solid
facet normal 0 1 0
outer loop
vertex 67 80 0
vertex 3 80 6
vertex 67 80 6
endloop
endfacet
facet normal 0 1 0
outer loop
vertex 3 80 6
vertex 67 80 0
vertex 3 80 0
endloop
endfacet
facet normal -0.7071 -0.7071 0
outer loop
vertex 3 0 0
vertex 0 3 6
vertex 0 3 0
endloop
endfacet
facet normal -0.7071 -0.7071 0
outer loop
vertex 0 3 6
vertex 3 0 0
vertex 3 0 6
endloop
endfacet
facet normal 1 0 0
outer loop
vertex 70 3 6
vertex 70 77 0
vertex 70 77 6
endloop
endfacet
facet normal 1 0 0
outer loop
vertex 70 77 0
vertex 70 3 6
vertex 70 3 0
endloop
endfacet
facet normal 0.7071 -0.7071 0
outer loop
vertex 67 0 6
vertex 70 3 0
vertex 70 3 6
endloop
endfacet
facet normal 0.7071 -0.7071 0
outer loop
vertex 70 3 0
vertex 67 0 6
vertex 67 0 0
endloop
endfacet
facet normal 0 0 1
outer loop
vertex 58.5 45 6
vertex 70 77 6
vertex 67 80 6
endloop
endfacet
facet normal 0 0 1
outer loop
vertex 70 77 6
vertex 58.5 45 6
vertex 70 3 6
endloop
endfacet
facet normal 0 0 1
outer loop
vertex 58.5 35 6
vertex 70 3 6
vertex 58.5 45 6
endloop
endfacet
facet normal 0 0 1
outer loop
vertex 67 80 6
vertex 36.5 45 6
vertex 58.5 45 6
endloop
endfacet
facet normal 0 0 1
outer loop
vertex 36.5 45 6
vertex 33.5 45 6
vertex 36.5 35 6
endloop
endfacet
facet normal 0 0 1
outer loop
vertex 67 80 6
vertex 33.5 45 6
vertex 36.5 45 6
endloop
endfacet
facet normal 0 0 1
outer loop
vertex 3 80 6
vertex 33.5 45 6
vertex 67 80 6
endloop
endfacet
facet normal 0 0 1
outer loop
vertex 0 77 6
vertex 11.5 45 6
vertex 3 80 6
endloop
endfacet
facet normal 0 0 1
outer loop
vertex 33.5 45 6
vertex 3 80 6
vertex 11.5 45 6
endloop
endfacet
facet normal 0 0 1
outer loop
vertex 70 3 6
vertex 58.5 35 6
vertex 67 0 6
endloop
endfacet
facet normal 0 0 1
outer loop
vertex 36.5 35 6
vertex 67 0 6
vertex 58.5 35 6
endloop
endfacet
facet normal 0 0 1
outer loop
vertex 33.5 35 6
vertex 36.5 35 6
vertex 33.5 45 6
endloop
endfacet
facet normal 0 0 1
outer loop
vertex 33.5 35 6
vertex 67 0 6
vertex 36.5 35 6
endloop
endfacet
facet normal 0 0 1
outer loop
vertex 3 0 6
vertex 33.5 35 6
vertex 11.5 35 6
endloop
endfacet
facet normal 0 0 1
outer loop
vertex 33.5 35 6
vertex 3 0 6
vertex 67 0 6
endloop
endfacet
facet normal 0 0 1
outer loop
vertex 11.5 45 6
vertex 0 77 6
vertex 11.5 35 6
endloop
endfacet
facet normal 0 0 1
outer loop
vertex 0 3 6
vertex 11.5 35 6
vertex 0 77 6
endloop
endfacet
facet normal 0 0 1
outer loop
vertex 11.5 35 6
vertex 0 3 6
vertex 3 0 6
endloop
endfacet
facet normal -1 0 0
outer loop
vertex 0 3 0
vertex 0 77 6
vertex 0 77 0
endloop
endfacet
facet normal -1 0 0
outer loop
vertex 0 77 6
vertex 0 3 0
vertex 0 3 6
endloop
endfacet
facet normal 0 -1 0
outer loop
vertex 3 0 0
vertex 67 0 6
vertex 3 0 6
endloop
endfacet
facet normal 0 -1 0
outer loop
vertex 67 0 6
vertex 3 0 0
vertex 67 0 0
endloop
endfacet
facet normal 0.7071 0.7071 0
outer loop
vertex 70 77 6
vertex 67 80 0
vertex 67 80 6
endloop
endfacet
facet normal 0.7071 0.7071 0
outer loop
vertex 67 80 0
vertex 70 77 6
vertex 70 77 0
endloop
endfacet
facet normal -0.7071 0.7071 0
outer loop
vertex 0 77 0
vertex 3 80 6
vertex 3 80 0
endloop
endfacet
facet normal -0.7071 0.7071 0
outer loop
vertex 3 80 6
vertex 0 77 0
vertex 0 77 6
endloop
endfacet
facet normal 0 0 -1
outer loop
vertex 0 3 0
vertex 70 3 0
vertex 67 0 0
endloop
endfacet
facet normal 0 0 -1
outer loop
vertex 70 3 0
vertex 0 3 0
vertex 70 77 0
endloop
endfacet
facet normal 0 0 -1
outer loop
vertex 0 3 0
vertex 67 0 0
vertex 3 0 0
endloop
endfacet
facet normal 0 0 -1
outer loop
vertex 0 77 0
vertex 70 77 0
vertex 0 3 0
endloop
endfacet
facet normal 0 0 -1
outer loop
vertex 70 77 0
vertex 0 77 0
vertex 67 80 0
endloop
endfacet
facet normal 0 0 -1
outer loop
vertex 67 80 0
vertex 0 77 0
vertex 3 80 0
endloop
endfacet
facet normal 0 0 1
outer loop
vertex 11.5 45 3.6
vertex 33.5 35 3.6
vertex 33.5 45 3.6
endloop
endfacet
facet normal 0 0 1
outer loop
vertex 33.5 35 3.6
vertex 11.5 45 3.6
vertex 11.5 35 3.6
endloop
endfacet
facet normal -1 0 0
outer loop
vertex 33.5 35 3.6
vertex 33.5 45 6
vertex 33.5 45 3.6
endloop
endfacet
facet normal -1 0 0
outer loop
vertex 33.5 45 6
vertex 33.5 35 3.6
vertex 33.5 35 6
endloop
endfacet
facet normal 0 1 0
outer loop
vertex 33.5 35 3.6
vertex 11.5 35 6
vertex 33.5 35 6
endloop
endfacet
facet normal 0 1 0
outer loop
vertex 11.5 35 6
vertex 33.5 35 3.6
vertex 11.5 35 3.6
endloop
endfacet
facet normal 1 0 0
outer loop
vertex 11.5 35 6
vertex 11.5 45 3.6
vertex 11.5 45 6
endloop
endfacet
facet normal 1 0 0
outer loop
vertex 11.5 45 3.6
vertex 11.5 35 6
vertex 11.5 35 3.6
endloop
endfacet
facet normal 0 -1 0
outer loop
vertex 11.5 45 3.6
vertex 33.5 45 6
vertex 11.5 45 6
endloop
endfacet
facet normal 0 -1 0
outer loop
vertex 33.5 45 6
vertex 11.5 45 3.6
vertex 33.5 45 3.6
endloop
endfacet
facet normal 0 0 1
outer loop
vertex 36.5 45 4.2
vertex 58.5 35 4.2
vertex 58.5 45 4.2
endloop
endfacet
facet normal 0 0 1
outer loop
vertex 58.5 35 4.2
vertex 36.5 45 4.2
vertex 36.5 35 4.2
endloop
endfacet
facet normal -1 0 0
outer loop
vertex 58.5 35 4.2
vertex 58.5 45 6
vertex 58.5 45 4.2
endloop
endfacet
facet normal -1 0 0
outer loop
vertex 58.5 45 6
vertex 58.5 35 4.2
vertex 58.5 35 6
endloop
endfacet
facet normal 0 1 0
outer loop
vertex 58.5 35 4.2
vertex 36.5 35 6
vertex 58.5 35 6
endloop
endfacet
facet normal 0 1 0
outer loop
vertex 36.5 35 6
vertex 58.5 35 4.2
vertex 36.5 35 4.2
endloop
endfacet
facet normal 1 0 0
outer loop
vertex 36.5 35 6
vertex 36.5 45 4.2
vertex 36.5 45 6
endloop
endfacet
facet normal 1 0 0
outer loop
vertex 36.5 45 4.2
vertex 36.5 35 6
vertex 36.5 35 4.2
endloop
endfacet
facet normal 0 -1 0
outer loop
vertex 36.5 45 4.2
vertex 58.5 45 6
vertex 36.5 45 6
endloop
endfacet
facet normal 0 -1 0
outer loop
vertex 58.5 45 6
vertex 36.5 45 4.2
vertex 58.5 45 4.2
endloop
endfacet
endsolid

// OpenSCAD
$fn = 32;

// ----------------------------------------------------------------------
// Windowed plate: 2 voids, 70 x 80 x 6 mm
// ----------------------------------------------------------------------

// --- parameters (mm) ---
plate_l = 70;             // plate length, X
plate_w = 80;             // plate width, Y
plate_t = 6;              // plate thickness, Z
edge_margin = 10;         // wall from the plate edge to any window
windows = 2;              // number of windows in the row
win_l = 22;               // window length
win_w = 10;               // window width
win_pitch = 25;           // window pitch along X
depth_1 = 2.4;            // depth of void 1 (full thickness = through)
depth_2 = 1.8;            // depth of void 2 (full thickness = through)
corner_c = 3;             // corner chamfer of the plate

profile = [[3, 0], [67, 0], [70, 3], [70, 77], [67, 80], [3, 80], [0, 77], [0, 3]];  // primary outline, 8 points, counter clockwise
void_1 = [[11.5, 35], [33.5, 35], [33.5, 45], [11.5, 45]];  // window 1 of the row, 4 points
void_2 = [[36.5, 35], [58.5, 35], [58.5, 45], [36.5, 45]];  // window 2 of the row, 4 points

// --- the one profile operation ---
difference() {
  linear_extrude(height = plate_t) polygon(points = profile);
  translate([0, 0, plate_t - depth_1])
    linear_extrude(height = depth_1 + 1) polygon(points = void_1);
  translate([0, 0, plate_t - depth_2])
    linear_extrude(height = depth_2 + 1) polygon(points = void_2);
}
